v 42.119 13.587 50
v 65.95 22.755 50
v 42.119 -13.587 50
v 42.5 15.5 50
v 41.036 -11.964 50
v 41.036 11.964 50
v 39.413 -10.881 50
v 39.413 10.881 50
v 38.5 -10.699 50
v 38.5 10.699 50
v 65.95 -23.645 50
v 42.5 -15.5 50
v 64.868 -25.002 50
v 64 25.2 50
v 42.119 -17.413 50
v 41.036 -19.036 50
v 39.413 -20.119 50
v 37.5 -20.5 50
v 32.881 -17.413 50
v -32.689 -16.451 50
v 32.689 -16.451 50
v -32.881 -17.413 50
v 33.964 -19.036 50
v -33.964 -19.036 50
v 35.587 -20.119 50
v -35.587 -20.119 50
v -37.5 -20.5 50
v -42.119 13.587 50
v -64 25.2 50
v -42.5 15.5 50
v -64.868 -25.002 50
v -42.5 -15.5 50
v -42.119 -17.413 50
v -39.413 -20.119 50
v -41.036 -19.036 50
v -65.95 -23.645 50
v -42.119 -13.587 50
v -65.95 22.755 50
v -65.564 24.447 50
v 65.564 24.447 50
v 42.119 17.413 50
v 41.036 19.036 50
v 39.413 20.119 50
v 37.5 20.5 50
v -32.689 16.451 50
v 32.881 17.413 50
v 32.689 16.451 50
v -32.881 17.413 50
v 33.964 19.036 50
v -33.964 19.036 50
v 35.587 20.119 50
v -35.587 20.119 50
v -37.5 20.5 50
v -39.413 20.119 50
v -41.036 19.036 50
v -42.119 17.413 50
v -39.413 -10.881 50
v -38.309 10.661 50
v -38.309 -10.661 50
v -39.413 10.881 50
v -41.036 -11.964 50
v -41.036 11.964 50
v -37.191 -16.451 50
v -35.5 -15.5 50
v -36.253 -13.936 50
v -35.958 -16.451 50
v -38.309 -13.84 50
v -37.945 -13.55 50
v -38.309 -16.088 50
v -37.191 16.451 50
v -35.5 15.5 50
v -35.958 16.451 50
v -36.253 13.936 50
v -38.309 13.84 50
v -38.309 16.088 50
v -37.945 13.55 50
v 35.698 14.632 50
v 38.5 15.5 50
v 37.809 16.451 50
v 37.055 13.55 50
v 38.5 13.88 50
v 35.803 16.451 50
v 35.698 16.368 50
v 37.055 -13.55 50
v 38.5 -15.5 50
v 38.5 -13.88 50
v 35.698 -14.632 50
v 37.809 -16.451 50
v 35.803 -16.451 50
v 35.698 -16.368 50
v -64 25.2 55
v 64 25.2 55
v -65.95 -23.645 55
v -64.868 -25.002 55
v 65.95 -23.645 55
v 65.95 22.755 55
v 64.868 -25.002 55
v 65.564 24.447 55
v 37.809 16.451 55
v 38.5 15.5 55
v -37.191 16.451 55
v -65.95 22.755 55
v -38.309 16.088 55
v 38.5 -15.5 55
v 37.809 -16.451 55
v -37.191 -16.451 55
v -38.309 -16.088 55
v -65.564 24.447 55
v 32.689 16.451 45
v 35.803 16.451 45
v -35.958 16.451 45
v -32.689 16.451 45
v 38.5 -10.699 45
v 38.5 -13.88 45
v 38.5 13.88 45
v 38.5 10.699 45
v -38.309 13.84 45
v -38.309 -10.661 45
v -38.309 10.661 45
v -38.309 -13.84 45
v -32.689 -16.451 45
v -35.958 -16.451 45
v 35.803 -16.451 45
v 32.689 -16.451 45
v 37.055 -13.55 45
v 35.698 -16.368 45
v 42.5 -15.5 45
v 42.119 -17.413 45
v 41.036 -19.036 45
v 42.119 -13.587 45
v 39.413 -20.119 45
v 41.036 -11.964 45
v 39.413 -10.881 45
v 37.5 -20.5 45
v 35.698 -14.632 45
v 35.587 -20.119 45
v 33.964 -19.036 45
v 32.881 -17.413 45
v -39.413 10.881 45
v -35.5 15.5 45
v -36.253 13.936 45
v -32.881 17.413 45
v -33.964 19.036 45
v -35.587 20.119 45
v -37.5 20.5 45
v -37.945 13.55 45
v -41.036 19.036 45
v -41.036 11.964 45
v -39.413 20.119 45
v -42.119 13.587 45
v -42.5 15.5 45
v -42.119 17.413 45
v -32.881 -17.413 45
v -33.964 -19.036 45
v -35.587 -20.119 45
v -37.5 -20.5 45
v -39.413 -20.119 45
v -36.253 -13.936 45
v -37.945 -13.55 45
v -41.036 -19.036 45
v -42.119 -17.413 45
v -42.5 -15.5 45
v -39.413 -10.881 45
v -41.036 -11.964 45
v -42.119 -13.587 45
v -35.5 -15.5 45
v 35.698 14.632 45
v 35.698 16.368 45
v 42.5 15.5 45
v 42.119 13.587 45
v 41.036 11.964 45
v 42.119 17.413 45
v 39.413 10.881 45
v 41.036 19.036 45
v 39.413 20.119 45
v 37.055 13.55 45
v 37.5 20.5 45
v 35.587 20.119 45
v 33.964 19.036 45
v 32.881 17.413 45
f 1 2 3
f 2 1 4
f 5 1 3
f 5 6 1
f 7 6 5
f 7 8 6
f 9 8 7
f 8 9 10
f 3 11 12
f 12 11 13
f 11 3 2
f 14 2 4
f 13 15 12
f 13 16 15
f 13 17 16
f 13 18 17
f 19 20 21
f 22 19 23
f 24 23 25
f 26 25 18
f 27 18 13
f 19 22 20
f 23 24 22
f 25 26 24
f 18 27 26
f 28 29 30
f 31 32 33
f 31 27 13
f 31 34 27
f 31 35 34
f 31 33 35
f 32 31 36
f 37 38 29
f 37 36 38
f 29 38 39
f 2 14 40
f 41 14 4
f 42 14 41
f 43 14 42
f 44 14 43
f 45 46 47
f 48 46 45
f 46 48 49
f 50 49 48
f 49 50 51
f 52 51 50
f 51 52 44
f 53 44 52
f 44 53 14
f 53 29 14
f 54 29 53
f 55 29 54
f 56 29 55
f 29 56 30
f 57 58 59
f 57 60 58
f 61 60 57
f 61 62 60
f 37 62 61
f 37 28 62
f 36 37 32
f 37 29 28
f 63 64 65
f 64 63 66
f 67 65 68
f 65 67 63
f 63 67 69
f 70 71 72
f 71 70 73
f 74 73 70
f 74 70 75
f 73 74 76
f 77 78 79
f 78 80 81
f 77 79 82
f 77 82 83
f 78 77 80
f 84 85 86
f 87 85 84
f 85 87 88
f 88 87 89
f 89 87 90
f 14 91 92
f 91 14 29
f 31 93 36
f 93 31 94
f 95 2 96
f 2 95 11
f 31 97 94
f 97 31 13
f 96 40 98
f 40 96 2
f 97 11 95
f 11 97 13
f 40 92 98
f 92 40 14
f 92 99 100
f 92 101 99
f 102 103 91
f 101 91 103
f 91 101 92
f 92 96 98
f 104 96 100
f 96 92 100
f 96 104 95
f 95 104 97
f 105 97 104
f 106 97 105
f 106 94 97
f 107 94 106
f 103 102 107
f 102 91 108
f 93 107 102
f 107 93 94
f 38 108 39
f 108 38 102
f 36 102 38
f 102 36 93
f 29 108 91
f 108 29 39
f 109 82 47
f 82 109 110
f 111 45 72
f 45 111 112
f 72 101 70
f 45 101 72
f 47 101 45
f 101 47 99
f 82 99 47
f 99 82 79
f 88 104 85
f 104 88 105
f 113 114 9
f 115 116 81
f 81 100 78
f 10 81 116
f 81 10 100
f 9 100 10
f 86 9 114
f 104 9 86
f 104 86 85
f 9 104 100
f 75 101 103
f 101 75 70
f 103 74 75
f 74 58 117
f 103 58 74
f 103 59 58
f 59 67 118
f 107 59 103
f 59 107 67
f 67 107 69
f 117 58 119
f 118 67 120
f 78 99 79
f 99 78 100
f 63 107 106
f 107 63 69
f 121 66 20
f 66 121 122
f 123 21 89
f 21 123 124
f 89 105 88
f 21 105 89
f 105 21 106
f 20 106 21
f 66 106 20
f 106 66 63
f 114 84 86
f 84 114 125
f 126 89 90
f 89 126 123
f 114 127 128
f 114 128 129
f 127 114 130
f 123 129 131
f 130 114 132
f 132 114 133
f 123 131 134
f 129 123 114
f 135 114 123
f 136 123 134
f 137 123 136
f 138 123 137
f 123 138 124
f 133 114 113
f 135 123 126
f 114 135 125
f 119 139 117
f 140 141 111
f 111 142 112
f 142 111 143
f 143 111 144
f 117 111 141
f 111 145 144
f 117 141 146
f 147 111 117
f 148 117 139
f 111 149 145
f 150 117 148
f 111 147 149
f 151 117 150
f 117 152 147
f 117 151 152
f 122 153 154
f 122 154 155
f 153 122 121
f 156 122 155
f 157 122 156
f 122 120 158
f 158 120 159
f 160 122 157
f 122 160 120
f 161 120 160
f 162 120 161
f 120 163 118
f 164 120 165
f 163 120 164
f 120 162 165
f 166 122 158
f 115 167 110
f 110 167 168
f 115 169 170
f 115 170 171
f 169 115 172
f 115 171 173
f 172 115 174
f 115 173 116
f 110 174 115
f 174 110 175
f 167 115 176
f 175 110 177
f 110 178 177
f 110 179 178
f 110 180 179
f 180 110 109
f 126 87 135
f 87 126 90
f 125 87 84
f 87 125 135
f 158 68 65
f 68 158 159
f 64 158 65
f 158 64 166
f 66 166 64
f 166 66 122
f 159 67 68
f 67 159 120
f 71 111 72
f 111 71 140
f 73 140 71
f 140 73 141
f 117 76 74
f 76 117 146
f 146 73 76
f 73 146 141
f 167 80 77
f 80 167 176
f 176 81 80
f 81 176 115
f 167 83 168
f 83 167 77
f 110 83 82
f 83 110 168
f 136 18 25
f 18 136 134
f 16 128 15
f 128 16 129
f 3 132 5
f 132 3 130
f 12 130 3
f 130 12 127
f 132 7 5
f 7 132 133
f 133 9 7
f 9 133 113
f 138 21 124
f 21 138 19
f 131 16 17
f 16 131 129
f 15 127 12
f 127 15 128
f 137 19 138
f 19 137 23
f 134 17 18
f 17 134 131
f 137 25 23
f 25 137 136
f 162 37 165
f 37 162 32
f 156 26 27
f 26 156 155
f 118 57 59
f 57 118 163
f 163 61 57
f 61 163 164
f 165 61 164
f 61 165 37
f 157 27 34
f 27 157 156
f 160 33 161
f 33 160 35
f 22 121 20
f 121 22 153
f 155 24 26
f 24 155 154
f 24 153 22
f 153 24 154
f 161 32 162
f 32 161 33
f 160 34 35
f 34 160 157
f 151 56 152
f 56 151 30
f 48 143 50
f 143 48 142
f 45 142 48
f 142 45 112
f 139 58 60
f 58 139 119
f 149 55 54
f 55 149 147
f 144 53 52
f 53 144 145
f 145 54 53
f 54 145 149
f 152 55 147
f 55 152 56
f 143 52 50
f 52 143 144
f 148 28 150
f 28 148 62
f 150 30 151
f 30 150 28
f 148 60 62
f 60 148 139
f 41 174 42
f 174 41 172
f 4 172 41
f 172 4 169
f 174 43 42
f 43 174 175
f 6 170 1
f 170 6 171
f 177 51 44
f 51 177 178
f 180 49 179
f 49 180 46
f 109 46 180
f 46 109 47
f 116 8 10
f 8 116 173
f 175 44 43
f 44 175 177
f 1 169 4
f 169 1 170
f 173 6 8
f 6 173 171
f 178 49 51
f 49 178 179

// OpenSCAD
// file: posts.scad
//	   A	
//  |-----|
//D |     | B
//  |-----|
//	   C

//usage:
//posts(x=100, y=50, z=50, h=25, r=10, center=true);


module posts (x,y,z,h,r, center=false) {

	a = center ? [x, -y, z] : [x-r, -y+r, z];
	b = center ? [-x, -y, z] :  [-x+r, -y+r , z];
	c = center ? [-x, y, z] : [-x+r, y-r ,z];
	d = center ?  [x, y, z] : [x-r, y-r ,z];
	
			translate(a)
			cylinder(h=h,r=r);
			translate(b)
			cylinder(h=h,r=r);
			translate(c)
			cylinder(h=h,r=r);
			translate(d)
			cylinder(h=h,r=r);
}
// file: dimensions.scad
keypad_x = 69.2;
keypad_y = 76.9;
keypad_z = 2;
keypad_radius = 10;

lcd_y = 66;
lcd_x = 25.2;
lcd_z = 2;
lcd_holex_x = 75;
lcd_holes_y = 31;

rfid_s = 41;

space = 30;
box_x = keypad_x + lcd_y + space;
box_y = max(keypad_y, lcd_y) + space;

box_z =  50;
wall_thickness = 5;
radius = 7.5;

lid_thickness = 5;
lid_lip = 3;

lid_bottom = box_z - lid_thickness;
// main file
include <dimensions.scad>
include <posts.scad>

module lcd_cut() {
        difference() {
        children()
		cube([ lcd_x, lcd_y, box_z ], center = true); 
    }
}


module lcd_posts (
            x =  lcd_holex_x / 2,
			y = lcd_holes_y /2 ,
			z = lid_bottom,
			h,
            r,
            center
			) {
			posts(
            x=x, y=y, z=z, h=h, r=r,
			center=center
		);
}

module lcd_mount() {

    module lcd_cut() {
        hull()
        lcd_posts(r=1, h=50, center=true);
    }
    
	difference(){
		rotate(90)
		hull()
		lcd_posts(
		x= lcd_x,
		y= lcd_y,
		z = box_z,
		h=5,
		r= 2,
        center=false
		);
		lcd_cut();
	}
        lcd_posts(r=2, h=5, center=true);
        difference() {
        //mounting posts
        lcd_posts(r=5, h=5, center=true);
		lcd_cut();
        //mounting holes
        }
  }

  lcd_mount();
